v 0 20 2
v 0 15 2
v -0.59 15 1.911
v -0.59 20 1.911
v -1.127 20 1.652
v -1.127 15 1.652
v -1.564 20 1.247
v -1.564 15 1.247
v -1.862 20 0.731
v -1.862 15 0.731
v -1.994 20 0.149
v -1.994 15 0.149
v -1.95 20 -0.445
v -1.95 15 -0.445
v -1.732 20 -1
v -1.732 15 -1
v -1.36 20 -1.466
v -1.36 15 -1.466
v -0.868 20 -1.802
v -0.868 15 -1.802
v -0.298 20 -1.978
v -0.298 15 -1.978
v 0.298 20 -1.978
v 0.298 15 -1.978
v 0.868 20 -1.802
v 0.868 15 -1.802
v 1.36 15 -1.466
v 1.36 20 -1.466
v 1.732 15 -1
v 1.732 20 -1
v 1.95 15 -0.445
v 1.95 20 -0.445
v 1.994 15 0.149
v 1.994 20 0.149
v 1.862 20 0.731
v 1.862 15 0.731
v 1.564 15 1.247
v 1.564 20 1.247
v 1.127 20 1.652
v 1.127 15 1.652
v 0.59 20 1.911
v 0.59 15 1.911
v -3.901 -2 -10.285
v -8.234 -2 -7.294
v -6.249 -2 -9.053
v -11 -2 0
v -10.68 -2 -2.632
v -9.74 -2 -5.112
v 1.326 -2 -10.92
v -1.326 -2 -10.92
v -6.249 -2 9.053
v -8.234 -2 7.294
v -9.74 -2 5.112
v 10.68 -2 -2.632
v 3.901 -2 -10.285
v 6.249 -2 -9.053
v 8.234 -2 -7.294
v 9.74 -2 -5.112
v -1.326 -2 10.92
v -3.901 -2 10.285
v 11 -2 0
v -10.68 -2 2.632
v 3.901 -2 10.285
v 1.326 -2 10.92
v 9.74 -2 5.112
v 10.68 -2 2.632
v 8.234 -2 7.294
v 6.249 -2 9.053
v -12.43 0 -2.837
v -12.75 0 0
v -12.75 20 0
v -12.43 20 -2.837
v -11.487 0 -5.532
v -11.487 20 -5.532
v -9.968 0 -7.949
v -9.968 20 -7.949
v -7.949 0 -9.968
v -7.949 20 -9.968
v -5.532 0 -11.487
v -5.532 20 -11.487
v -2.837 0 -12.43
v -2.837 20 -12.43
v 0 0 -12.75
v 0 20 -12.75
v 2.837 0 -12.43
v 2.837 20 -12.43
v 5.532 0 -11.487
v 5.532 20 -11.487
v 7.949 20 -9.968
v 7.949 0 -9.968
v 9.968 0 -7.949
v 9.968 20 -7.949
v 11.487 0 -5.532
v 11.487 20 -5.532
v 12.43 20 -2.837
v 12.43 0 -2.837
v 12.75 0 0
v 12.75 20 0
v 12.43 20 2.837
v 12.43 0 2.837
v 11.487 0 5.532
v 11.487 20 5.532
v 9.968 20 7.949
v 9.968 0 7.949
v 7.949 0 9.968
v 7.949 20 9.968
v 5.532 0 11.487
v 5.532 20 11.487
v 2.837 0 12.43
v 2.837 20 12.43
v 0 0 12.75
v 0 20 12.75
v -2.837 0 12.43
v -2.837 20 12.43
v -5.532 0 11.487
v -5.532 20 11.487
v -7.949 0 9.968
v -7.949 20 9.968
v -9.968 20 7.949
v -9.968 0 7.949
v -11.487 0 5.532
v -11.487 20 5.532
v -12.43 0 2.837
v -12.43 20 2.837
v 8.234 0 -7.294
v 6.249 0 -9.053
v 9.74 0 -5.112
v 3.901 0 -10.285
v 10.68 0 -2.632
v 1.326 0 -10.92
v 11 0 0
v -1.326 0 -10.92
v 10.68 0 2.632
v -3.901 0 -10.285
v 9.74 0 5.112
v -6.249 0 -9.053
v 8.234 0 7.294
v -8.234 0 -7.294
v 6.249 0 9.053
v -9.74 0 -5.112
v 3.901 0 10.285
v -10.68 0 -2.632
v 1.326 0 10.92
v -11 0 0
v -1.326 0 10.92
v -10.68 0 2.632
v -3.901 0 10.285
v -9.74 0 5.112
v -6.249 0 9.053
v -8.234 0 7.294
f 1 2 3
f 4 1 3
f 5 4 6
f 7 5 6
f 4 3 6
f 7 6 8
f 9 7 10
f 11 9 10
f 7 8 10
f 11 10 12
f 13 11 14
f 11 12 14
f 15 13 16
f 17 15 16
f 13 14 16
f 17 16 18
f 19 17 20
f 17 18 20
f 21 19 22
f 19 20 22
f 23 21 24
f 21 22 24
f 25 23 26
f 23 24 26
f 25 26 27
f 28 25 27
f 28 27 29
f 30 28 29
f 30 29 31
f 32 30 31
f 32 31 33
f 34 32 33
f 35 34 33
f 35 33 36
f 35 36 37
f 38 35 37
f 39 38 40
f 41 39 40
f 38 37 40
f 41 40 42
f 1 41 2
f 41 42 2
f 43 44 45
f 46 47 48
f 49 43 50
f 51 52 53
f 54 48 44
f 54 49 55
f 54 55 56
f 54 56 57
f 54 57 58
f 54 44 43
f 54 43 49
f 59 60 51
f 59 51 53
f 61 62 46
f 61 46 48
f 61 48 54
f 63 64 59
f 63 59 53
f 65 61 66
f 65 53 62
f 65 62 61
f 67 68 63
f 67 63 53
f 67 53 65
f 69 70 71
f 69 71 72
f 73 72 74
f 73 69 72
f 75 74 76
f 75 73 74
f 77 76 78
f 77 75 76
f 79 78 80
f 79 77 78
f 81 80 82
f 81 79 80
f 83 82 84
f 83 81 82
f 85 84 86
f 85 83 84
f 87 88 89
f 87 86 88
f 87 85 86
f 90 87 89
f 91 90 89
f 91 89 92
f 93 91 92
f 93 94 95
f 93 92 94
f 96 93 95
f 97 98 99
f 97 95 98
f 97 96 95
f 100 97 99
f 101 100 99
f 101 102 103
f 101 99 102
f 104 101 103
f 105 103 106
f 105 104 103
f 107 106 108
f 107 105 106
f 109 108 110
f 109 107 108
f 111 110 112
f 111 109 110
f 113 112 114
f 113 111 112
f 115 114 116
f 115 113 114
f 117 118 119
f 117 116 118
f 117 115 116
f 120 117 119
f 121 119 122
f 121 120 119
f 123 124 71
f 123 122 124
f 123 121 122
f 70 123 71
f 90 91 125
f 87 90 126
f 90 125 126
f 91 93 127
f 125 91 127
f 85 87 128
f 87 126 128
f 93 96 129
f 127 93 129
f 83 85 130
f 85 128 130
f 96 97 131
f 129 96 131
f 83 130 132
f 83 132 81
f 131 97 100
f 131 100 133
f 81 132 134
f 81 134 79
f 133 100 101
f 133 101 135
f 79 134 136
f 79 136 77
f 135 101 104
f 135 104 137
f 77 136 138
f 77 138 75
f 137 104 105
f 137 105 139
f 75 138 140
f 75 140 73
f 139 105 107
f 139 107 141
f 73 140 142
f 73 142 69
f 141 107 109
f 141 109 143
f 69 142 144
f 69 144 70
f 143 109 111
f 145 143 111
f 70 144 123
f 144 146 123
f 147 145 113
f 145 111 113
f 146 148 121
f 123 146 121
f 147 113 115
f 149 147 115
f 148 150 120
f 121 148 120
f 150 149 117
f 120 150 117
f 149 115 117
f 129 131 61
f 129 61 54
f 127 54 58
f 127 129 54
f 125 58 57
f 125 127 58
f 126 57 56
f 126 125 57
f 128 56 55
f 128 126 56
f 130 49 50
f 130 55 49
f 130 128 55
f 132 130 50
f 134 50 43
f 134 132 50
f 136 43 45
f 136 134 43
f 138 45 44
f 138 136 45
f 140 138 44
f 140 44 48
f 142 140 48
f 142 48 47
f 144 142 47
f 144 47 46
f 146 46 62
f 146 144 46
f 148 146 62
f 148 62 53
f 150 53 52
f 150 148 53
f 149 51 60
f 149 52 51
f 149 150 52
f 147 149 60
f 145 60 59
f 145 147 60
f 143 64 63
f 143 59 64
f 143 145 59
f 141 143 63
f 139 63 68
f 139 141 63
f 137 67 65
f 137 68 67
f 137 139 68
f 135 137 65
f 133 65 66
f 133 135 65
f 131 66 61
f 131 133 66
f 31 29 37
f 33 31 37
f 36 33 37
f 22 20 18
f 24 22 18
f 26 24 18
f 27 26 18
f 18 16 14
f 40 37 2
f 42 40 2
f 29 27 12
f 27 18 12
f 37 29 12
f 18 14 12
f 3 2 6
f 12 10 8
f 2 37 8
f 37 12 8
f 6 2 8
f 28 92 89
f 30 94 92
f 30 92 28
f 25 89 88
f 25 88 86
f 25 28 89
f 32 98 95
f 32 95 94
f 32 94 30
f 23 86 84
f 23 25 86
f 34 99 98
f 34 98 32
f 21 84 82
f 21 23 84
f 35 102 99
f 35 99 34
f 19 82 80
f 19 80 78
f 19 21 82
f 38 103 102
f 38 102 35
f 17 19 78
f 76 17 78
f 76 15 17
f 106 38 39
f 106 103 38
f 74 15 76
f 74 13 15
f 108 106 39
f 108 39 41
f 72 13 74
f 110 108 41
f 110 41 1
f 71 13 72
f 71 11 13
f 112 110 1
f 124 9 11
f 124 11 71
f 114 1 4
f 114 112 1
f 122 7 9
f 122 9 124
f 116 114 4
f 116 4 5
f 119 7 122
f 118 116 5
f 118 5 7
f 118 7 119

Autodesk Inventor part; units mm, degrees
ref_plane "YZ Plane" through (0, 0, 0) normal (1, 0, 0) x (0, 1, 0)
ref_plane "XZ Plane" through (0, 0, 0) normal (0, 1, 0) x (-1, 0, 0)
ref_plane "XY Plane" through (0, 0, 0) normal (0, 0, 1) x (1, 0, 0)
sketch "Sketch1" plane through (0, 0, 0) normal (0, 1, 0) x (-1, 0, 0)
  circle A0 centre (0, 0) radius 12.75
  dimension "d0" = 25.5
extrude "Extrusion1" add sketch "Sketch1" along normal blind 20
sketch "Sketch2" plane through (0, 0, 0) normal (0, -1, 0) x (1, 0, 0)
  circle A0 centre (0, 0) radius 11
  dimension "d3" = 22
extrude "Extrusion2" add sketch "Sketch2" along normal blind 2
sketch "Sketch3" plane through (0, 20, 0) normal (0, 1, 0) x (1, 0, 0)
  point P0 (0, 0)
  point P1 (0, 0)
hole "Hole1" at (0, 20, 0) direction (0, -1, 0) diameter 4 depth 5
thread "Thread1" size "M4x0.7" class "6H" standard "ANSI Metric M Profile" full length
properties part number "magnet"
